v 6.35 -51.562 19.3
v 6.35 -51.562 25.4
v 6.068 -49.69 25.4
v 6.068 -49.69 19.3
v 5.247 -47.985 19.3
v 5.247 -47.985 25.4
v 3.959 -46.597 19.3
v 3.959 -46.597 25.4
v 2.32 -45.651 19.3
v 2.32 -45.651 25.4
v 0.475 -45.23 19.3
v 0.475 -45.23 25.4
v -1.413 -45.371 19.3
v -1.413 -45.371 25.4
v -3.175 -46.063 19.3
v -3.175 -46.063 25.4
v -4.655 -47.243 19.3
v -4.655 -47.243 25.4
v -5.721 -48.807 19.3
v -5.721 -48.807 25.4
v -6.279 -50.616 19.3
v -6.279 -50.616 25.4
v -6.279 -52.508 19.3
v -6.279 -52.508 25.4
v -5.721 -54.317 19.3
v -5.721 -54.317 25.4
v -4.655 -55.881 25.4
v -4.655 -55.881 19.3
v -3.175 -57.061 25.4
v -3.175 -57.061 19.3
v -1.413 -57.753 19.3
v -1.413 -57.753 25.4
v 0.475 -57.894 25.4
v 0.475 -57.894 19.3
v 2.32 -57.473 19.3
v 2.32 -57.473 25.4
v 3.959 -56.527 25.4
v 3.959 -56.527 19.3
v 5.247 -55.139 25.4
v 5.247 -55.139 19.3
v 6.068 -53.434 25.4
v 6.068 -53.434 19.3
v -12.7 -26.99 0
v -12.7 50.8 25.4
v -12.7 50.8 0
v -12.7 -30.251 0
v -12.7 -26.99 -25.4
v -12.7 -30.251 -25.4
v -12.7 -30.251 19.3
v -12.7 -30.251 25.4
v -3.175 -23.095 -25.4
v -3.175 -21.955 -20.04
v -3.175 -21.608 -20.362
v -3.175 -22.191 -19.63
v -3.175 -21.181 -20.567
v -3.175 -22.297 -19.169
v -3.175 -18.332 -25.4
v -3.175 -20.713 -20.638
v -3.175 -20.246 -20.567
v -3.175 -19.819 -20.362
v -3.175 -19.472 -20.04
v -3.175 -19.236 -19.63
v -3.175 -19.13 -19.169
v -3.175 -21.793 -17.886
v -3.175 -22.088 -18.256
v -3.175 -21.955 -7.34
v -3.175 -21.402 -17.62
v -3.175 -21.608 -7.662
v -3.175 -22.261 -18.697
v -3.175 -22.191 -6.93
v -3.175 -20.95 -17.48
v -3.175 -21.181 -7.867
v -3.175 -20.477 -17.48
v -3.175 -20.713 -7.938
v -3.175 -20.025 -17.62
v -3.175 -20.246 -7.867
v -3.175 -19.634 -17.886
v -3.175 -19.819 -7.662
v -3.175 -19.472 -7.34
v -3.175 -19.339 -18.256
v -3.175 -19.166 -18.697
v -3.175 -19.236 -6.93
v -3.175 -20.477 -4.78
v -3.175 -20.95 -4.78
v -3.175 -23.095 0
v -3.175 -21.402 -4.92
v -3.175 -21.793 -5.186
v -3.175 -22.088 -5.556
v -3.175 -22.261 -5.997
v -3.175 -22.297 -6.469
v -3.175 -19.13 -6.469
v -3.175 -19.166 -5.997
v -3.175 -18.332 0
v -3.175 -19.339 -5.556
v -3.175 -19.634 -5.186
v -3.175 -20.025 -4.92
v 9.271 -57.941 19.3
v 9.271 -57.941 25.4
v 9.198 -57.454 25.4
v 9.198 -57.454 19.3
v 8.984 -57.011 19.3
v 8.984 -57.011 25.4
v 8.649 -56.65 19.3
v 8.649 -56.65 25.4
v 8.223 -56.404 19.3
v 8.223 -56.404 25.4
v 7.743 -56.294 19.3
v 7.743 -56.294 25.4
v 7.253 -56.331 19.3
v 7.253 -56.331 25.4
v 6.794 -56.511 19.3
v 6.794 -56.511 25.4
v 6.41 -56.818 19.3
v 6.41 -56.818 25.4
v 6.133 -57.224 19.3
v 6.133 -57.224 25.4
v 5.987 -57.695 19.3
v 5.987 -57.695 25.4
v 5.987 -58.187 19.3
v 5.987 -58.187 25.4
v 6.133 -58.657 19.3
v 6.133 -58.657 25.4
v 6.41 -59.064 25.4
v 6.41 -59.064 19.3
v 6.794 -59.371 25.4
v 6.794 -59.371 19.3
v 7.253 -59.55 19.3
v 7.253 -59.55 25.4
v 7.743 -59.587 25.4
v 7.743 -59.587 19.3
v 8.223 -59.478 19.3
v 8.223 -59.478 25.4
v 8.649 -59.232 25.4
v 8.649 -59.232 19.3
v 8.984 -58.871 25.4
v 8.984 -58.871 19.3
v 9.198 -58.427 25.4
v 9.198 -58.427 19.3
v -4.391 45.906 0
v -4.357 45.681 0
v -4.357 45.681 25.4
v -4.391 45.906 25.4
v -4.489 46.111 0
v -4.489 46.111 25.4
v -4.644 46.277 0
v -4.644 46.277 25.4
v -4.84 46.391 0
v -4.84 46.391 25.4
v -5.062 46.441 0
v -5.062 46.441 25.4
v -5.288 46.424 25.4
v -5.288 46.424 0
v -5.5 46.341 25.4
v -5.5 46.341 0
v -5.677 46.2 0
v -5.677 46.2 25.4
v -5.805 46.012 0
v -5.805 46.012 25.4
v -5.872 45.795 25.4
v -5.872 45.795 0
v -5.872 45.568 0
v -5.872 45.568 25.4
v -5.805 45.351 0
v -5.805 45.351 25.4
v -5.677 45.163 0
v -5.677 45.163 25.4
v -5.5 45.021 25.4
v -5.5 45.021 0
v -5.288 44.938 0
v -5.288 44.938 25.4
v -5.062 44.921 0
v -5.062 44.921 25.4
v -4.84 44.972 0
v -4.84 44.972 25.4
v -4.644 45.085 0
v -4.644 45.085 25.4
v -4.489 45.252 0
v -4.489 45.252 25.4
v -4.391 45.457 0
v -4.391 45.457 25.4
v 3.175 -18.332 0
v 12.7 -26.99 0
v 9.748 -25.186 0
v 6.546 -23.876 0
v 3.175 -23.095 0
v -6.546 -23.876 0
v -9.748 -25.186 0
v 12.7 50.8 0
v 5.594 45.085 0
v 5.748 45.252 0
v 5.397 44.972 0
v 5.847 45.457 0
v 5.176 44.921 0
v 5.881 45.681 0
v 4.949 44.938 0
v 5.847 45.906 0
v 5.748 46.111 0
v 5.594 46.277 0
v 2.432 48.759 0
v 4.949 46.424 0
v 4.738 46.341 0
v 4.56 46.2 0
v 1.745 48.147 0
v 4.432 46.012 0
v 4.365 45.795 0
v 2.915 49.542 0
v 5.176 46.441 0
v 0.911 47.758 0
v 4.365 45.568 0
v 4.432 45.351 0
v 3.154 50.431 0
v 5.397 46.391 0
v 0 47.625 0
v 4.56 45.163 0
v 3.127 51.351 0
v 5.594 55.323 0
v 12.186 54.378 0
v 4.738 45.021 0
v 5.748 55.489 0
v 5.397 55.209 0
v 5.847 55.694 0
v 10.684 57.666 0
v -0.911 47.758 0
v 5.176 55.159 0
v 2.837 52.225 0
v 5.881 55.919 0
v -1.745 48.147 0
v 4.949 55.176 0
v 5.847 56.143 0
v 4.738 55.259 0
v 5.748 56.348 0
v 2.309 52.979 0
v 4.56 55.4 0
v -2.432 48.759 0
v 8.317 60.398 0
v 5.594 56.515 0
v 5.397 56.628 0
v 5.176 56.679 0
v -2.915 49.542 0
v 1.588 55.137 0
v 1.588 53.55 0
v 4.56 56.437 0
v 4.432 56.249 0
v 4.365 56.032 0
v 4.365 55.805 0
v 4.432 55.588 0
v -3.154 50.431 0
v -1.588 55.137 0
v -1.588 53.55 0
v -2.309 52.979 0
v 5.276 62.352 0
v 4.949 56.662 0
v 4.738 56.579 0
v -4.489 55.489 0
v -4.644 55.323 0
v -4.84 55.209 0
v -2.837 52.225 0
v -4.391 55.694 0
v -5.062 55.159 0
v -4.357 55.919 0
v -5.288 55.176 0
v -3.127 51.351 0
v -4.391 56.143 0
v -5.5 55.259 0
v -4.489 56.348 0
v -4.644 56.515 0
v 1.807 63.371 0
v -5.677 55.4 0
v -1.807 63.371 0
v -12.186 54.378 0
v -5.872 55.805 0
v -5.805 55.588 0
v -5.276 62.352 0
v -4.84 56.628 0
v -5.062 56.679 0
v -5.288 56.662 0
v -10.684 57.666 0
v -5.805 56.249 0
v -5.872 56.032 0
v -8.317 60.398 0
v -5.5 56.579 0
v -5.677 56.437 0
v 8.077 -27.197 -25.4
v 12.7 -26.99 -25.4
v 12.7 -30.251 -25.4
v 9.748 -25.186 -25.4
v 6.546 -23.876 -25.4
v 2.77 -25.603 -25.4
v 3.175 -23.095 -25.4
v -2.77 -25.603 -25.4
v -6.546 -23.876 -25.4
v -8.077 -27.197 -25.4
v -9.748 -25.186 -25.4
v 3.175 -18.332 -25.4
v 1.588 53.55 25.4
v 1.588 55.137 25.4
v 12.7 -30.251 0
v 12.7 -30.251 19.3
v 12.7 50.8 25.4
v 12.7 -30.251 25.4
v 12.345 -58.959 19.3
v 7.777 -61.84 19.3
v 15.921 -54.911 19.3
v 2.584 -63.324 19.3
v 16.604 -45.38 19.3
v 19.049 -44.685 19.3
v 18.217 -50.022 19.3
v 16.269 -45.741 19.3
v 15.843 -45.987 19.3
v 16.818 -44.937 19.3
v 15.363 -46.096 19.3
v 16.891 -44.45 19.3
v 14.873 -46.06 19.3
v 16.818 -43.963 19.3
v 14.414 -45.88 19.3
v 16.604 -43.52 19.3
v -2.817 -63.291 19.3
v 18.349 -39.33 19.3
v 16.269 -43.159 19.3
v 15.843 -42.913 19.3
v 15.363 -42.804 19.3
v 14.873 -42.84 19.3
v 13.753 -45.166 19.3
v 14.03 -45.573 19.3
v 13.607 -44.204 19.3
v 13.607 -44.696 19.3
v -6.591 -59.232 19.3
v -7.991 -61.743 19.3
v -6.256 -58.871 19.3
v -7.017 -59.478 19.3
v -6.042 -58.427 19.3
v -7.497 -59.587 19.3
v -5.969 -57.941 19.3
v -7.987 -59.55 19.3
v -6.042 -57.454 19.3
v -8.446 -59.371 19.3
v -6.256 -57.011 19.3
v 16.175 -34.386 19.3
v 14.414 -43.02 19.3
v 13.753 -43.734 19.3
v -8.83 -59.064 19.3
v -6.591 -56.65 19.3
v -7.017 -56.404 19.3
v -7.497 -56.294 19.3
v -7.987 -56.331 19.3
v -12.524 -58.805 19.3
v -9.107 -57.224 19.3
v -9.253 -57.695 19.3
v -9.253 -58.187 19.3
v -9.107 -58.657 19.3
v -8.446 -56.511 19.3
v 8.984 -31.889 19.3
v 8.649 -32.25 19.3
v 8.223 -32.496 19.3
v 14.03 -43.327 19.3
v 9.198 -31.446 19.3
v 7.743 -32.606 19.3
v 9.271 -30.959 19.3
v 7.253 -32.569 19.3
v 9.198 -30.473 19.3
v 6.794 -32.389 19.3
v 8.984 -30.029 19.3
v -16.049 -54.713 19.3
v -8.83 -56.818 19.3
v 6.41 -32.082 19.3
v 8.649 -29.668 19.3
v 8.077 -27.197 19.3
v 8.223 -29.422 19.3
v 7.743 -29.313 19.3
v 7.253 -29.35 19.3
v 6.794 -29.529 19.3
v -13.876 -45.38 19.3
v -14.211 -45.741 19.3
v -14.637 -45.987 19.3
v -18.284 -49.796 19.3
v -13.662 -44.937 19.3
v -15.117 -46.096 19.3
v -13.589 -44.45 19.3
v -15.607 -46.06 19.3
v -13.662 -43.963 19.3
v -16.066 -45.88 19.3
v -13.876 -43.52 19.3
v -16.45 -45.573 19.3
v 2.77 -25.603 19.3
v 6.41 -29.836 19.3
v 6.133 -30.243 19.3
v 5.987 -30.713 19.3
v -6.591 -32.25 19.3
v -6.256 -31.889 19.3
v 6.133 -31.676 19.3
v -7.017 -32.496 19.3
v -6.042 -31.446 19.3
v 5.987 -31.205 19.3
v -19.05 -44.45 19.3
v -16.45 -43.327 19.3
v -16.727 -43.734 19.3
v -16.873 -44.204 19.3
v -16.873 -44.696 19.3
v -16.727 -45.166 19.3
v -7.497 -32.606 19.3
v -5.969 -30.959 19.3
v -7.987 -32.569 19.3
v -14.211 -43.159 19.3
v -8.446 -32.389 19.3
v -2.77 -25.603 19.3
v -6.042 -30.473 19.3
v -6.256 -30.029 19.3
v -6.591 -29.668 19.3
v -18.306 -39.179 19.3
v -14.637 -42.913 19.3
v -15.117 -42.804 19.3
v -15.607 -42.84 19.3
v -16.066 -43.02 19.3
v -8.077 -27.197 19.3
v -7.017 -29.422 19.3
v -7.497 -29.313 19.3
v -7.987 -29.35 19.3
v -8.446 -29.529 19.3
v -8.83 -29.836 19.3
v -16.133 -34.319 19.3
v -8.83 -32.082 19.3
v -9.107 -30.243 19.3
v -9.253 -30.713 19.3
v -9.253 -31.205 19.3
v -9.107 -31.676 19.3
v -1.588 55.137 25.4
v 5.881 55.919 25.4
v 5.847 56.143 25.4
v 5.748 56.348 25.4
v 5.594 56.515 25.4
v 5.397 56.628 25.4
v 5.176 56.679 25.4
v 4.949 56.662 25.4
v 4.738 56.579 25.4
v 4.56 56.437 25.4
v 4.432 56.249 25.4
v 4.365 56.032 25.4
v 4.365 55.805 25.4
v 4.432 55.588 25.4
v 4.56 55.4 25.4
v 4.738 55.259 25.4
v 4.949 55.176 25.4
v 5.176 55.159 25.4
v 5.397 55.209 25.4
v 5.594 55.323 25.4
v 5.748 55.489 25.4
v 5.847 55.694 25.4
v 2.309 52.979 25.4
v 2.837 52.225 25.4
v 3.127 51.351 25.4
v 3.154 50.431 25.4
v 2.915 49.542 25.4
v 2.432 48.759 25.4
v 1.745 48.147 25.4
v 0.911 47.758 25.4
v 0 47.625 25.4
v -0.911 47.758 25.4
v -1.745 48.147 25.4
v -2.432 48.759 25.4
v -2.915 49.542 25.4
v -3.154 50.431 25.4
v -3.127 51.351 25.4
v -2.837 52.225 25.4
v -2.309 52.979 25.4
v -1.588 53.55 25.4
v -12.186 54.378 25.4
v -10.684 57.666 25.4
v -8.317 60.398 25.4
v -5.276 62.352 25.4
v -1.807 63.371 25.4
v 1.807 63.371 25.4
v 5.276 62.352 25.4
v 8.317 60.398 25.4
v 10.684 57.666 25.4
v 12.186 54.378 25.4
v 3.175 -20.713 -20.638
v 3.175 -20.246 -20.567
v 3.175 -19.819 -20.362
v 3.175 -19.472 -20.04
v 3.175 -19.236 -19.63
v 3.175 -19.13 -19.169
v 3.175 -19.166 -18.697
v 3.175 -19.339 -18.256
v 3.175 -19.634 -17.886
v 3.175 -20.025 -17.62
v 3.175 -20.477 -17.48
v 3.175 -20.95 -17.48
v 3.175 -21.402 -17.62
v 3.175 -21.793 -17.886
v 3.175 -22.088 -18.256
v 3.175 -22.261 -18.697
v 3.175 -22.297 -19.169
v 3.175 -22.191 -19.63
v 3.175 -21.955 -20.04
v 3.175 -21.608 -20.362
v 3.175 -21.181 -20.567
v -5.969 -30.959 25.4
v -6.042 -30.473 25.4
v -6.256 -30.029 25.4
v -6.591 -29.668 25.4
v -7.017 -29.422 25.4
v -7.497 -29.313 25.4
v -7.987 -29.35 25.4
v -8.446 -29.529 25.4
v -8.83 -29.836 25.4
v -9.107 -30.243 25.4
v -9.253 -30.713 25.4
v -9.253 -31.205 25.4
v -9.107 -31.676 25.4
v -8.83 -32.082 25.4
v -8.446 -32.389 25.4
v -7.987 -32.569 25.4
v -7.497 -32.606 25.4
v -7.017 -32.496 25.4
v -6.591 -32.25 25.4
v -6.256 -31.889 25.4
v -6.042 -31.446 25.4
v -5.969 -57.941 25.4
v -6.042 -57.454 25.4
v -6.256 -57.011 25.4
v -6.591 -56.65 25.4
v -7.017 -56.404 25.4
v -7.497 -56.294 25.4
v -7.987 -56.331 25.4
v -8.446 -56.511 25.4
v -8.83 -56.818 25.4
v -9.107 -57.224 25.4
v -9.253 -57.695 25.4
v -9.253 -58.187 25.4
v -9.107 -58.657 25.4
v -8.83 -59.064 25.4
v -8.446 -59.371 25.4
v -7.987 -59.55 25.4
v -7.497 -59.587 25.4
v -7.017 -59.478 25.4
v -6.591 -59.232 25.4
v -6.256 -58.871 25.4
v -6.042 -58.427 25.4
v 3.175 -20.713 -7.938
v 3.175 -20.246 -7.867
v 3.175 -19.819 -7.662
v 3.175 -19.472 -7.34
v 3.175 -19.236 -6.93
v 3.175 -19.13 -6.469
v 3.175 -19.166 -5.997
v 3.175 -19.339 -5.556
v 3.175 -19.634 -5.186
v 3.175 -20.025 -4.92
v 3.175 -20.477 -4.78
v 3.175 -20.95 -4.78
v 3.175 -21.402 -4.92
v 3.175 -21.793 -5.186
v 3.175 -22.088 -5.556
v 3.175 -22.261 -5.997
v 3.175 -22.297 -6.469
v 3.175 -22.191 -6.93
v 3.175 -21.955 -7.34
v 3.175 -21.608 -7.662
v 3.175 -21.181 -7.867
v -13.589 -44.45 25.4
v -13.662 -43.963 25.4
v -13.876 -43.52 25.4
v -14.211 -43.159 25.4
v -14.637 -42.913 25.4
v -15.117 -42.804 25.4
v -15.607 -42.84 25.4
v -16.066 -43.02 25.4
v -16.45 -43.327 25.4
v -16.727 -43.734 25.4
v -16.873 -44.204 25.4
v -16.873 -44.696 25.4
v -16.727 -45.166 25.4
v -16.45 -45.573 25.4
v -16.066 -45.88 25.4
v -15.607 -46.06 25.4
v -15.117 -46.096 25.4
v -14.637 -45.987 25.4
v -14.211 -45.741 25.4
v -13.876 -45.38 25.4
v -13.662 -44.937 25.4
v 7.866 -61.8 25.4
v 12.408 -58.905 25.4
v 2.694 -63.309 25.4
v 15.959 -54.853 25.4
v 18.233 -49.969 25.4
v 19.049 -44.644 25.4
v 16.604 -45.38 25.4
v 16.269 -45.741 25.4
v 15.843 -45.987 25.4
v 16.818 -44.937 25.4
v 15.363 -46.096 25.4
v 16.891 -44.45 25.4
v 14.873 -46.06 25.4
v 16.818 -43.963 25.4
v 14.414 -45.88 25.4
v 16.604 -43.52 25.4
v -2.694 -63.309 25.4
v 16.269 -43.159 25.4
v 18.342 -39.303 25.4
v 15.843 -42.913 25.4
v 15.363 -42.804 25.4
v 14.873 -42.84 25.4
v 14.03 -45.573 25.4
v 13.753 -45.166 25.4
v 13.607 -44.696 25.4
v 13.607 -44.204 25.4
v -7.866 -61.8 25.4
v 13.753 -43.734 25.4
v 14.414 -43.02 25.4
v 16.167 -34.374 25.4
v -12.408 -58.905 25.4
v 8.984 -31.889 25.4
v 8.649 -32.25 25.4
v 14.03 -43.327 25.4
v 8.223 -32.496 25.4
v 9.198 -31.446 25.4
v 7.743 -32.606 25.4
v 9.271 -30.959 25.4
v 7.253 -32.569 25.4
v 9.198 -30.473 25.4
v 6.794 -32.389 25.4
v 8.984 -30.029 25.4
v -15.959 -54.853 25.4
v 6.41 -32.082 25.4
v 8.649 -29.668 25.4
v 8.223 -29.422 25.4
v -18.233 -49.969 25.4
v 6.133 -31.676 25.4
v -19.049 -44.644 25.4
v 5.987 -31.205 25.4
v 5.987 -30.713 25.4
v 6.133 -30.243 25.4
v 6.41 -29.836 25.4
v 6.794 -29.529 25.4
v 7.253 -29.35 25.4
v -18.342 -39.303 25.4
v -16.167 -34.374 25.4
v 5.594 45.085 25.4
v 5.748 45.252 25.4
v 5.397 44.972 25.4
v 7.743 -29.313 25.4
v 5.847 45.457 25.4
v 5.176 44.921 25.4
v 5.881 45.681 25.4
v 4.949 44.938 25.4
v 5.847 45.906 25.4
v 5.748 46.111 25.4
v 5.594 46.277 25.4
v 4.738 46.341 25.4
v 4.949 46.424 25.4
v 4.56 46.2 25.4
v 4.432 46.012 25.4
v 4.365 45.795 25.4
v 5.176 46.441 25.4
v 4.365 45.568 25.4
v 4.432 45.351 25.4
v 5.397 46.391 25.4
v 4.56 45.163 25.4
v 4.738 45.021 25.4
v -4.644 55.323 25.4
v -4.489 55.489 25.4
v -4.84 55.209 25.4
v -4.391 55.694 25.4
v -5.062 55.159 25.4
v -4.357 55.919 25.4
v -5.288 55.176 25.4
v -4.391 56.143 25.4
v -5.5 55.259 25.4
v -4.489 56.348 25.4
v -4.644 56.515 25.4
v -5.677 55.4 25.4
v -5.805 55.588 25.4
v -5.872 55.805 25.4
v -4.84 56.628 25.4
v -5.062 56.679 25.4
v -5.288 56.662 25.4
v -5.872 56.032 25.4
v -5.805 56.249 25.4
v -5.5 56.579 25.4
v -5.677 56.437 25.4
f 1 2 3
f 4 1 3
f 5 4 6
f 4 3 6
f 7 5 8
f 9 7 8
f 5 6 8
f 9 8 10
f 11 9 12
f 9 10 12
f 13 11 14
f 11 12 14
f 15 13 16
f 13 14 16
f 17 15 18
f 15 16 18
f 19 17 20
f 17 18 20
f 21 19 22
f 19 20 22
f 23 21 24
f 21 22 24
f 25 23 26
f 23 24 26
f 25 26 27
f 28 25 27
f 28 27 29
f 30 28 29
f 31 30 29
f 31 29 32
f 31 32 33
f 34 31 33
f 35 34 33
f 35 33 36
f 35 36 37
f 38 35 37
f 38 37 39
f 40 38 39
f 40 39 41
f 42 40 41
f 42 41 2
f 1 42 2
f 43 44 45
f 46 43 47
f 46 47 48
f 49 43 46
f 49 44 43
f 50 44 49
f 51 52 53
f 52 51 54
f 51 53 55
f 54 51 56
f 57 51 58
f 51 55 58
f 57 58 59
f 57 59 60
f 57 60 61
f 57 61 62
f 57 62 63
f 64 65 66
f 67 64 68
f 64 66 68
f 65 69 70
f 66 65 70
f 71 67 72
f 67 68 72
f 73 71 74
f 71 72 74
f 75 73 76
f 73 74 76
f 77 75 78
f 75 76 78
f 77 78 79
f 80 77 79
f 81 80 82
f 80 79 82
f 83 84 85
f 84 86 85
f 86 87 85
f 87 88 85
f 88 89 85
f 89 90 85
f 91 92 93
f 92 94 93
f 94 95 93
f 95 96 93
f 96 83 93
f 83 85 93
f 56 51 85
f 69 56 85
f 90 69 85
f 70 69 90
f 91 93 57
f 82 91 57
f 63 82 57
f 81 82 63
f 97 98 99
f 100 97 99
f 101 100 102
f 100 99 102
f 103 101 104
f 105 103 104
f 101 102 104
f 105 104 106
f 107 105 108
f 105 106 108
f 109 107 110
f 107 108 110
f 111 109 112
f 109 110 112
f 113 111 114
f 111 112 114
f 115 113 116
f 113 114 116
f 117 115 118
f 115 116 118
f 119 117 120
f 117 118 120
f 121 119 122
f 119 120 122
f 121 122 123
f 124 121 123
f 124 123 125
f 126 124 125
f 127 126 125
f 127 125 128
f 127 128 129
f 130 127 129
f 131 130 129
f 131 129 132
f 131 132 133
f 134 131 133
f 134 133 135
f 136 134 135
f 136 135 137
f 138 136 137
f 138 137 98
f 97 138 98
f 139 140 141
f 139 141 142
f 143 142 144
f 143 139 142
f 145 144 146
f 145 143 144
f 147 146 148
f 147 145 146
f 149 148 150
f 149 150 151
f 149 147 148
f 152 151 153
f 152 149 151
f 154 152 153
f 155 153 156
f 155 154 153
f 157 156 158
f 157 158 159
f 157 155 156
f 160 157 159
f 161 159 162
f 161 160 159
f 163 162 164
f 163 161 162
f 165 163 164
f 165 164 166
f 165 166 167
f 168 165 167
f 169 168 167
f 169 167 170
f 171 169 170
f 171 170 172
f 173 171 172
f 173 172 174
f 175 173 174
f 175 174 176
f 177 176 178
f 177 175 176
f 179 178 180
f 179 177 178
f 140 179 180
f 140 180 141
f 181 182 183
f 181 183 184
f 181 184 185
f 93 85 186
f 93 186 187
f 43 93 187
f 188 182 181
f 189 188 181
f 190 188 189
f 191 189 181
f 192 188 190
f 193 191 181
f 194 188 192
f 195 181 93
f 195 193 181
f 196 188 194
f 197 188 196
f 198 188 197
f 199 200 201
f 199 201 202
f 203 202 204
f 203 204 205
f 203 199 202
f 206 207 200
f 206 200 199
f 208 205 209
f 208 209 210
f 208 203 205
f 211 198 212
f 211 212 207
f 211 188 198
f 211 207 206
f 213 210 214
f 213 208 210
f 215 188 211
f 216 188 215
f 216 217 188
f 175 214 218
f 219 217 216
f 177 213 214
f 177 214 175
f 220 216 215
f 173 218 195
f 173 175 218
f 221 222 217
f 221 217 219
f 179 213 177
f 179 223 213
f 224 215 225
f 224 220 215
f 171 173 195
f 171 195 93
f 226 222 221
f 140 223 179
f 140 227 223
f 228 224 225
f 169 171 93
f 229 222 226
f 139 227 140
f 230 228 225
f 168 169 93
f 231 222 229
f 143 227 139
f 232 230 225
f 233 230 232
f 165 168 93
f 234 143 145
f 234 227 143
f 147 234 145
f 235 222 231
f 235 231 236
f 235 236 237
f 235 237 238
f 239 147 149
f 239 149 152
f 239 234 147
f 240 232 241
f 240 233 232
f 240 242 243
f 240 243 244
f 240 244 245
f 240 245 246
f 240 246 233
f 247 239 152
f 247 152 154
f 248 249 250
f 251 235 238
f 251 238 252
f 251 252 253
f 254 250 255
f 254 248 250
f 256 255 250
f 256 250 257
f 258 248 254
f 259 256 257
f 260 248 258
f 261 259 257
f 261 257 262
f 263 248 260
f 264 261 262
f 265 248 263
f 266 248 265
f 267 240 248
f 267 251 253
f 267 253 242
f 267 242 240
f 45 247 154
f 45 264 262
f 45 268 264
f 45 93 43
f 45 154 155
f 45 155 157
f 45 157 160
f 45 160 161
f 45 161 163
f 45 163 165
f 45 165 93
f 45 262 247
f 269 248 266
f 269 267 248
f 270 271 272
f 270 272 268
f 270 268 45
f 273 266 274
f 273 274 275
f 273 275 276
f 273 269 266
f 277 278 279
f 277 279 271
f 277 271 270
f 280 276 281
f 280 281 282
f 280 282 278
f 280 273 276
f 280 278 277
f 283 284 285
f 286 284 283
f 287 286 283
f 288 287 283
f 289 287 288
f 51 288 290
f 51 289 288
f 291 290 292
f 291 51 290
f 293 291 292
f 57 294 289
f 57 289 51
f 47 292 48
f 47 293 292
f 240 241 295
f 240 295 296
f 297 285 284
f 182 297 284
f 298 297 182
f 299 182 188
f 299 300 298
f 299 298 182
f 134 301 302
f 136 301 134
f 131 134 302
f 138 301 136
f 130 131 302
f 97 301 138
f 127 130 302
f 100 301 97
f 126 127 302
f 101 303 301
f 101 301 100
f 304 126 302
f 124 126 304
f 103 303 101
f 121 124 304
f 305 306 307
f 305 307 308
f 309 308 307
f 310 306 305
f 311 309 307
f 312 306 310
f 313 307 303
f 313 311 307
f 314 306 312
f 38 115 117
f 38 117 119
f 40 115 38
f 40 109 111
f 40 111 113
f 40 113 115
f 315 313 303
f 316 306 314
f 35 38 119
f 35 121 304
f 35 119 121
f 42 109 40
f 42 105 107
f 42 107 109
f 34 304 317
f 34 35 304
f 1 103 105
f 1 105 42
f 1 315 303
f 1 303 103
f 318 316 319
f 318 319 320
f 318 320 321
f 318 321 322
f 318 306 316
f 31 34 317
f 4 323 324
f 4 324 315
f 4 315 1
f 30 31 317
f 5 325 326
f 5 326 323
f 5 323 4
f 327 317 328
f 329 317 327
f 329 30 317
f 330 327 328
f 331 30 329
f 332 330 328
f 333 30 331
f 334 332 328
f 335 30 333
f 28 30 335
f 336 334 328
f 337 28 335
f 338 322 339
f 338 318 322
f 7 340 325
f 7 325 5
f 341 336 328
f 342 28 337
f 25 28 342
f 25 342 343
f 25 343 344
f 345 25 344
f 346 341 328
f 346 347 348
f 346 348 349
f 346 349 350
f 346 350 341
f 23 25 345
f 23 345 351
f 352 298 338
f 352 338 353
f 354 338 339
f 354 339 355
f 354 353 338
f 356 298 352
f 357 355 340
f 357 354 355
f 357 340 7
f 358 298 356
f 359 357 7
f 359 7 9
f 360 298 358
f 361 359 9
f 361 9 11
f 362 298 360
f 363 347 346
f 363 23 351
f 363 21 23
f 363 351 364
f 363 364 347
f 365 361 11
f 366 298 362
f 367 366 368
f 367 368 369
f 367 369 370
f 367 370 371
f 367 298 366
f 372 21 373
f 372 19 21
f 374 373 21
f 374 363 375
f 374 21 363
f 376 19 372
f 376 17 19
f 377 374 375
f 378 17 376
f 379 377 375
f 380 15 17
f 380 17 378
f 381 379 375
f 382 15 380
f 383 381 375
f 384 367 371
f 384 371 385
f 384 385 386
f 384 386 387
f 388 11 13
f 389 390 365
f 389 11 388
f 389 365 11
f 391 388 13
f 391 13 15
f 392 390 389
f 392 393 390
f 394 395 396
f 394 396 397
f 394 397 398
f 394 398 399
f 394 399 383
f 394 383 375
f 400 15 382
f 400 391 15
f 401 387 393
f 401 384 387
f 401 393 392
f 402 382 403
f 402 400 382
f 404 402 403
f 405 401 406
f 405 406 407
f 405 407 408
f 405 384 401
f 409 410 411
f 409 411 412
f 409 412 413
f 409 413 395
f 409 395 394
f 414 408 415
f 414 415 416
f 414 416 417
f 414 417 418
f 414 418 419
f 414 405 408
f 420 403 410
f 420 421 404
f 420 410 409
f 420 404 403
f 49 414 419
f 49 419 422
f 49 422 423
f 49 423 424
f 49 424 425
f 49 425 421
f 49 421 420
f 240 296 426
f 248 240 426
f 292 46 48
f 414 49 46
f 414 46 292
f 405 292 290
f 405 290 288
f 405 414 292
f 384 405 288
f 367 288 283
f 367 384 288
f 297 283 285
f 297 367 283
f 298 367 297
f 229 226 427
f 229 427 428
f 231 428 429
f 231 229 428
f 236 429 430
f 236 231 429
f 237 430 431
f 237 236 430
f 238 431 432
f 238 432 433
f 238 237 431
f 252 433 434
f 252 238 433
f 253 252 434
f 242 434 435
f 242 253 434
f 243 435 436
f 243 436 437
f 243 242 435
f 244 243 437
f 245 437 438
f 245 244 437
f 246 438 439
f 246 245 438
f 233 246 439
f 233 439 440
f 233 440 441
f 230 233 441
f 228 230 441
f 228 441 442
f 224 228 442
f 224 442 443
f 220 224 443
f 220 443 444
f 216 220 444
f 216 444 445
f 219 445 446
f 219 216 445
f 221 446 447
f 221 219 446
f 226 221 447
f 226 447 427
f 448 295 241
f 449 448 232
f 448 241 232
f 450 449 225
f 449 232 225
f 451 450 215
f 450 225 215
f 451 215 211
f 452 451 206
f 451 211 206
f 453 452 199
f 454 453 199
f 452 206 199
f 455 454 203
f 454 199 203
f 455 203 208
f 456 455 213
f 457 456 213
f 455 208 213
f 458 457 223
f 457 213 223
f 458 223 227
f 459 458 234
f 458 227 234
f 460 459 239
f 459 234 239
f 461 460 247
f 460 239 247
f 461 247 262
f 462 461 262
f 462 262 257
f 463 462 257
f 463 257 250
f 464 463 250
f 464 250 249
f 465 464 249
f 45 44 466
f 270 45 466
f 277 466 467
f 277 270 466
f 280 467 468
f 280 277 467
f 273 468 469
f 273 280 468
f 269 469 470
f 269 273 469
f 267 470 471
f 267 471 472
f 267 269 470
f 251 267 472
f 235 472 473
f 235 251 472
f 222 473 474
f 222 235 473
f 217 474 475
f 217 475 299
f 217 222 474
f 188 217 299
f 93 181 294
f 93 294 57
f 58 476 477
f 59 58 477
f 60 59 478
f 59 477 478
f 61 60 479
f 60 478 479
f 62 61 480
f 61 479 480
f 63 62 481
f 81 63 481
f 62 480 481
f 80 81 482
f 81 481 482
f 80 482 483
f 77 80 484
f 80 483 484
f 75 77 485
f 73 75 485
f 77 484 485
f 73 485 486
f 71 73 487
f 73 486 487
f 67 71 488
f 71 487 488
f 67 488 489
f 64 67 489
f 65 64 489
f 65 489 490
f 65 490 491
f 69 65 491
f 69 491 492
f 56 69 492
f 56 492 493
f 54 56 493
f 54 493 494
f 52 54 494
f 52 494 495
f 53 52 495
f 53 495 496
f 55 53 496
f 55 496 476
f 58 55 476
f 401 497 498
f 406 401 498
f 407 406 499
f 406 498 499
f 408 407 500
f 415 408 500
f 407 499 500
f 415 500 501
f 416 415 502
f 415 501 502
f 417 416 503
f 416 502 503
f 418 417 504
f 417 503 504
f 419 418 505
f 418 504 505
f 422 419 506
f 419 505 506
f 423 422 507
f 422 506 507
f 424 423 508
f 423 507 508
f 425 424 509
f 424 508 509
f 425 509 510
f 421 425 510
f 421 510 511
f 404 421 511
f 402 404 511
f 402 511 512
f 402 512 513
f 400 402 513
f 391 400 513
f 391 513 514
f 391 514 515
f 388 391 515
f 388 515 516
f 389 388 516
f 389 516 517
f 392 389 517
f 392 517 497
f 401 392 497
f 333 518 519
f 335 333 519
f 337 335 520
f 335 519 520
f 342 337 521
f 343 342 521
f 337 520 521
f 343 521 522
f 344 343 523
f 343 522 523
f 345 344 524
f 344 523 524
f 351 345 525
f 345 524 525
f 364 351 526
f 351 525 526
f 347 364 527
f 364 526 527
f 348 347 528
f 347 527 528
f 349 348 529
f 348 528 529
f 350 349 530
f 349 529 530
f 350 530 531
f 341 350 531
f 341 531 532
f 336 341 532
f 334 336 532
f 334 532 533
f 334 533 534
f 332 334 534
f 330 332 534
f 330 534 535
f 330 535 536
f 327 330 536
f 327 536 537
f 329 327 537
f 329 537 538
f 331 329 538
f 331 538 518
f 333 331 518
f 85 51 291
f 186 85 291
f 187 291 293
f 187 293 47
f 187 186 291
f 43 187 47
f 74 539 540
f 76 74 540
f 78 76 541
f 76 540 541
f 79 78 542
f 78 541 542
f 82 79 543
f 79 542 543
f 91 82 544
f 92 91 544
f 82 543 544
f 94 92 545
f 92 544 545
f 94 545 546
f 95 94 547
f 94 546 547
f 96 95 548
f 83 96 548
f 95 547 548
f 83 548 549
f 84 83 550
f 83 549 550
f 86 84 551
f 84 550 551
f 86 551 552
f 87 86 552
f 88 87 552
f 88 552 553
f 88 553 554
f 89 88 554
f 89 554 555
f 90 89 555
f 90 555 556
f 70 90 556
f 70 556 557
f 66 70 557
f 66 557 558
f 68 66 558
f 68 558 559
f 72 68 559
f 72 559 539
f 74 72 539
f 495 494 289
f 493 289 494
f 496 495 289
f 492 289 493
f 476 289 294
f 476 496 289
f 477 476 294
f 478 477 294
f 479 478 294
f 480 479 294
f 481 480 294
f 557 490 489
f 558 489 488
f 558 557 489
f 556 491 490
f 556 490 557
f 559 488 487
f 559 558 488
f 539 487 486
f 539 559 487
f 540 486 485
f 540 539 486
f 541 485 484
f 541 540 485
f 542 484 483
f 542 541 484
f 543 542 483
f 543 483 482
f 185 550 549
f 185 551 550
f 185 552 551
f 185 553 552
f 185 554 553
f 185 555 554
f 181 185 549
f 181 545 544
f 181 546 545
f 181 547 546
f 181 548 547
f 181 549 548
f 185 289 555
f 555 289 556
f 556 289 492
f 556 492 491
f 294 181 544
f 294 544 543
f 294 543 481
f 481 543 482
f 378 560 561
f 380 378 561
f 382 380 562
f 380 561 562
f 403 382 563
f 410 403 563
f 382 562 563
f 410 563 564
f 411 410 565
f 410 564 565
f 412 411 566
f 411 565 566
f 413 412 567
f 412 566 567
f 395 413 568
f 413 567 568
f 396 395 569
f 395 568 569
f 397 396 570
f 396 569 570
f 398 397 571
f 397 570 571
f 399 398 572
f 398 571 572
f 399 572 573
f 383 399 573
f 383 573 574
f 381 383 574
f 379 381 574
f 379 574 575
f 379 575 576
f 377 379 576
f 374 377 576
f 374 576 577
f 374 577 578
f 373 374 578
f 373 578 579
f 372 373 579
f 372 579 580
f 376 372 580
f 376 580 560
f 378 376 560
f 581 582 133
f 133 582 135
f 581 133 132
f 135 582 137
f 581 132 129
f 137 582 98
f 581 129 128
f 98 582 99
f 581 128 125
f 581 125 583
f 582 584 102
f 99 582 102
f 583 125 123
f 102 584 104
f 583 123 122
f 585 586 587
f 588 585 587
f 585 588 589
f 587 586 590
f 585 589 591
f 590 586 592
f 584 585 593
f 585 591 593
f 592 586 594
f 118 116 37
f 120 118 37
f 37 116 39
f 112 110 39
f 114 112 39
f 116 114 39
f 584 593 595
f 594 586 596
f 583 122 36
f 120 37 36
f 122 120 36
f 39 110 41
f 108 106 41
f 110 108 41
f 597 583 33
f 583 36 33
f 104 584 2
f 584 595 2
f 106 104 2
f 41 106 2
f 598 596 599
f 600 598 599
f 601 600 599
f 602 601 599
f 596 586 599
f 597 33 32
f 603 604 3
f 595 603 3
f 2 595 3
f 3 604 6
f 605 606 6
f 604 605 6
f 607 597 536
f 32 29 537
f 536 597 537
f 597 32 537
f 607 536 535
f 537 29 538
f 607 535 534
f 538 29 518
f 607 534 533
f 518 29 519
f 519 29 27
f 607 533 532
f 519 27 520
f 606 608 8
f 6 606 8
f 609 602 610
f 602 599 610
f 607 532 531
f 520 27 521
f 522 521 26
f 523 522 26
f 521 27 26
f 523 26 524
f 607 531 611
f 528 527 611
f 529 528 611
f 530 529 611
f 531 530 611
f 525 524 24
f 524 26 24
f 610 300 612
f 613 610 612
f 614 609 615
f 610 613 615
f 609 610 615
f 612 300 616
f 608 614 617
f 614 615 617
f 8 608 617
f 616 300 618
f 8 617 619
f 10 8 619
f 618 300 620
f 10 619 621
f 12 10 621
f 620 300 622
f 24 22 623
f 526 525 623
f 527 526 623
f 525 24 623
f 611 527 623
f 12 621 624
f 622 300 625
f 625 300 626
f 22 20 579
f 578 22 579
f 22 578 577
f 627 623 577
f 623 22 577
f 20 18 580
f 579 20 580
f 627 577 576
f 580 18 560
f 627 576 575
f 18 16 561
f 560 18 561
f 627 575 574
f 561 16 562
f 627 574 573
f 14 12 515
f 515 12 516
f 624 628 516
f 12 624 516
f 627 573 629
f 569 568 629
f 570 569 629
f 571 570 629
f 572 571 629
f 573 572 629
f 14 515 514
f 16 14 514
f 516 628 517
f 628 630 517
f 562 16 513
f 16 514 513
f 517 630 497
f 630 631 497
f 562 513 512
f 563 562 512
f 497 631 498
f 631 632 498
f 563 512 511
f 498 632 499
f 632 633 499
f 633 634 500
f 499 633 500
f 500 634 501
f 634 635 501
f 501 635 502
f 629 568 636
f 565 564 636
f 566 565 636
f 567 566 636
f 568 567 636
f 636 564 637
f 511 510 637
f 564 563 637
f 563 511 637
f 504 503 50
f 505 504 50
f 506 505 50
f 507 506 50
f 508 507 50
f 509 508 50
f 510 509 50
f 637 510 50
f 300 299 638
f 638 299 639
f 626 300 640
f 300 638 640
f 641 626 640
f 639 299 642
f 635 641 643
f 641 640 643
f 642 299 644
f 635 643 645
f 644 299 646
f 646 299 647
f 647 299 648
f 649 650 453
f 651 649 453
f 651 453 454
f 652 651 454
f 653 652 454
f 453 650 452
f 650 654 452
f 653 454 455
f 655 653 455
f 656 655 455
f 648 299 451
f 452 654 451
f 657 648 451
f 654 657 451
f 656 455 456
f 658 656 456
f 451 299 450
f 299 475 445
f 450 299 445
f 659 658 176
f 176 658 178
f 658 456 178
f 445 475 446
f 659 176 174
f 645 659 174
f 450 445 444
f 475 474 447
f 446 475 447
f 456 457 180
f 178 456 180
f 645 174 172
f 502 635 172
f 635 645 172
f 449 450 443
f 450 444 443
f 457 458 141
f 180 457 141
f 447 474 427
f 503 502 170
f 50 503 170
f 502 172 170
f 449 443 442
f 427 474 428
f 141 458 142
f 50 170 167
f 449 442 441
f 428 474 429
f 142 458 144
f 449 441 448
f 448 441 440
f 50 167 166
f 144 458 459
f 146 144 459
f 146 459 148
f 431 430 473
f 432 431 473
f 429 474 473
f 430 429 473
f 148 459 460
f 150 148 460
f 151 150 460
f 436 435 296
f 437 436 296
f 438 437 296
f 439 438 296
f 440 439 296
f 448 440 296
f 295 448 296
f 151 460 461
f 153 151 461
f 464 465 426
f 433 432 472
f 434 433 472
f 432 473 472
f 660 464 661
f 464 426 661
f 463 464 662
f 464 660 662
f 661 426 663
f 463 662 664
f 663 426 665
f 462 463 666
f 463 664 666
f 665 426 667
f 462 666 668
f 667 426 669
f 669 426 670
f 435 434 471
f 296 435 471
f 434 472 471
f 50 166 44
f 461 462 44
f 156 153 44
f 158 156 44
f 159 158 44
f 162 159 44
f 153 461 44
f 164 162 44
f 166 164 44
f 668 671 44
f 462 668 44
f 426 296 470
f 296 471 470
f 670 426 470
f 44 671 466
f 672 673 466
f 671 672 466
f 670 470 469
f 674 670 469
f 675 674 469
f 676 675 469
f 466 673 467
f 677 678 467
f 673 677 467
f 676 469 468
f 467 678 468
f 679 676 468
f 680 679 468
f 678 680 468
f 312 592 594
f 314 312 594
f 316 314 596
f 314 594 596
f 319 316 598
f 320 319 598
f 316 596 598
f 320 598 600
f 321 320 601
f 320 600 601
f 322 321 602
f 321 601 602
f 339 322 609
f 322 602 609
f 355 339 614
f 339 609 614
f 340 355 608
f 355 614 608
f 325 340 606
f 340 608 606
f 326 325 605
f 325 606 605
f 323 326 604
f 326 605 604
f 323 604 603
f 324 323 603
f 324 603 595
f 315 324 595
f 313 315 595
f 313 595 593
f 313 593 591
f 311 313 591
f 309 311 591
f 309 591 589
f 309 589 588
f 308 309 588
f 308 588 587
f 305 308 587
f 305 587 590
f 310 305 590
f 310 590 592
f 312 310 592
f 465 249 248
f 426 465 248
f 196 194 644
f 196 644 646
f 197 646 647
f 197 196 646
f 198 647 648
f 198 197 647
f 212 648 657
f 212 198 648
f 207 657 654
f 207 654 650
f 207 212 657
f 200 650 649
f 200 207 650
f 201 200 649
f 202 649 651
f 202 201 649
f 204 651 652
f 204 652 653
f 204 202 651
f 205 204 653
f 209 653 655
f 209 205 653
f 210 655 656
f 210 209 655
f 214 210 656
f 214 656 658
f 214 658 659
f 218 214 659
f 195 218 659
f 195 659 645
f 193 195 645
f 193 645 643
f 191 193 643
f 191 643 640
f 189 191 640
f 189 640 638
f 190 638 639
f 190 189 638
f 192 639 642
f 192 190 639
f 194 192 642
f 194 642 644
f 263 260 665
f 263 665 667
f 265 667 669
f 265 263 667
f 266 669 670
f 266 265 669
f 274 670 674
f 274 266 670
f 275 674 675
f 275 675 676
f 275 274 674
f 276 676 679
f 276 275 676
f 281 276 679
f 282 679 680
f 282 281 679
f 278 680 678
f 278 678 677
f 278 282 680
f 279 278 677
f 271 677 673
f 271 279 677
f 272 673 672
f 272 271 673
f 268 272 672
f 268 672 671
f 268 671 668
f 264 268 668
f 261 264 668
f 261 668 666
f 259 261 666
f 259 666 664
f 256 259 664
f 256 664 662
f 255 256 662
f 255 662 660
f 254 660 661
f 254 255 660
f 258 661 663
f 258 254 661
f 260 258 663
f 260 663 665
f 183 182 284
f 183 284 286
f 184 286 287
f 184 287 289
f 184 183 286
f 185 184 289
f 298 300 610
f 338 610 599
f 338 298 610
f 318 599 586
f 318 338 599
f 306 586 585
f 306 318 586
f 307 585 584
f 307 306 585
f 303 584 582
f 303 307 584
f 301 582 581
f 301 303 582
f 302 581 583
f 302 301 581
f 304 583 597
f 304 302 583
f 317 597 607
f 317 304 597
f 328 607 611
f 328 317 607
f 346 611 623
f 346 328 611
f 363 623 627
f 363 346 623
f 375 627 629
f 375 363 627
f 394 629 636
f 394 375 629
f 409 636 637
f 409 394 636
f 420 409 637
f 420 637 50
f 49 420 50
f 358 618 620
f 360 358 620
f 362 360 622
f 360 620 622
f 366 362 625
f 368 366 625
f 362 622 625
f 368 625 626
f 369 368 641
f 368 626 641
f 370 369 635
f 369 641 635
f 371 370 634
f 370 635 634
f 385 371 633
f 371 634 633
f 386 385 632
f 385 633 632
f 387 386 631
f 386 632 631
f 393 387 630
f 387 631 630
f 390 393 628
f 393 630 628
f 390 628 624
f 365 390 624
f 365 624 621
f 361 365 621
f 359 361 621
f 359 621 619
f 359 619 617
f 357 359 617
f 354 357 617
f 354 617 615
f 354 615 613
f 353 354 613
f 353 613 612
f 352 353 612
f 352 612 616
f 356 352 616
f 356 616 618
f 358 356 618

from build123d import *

# Parameters (mm, degrees)
SKETCH1_R           = 3.175
SKETCH1_R_2         = 0.762
BOSS_EXTRUDE1_DEPTH = 25.4
SKETCH2_R           = 19.05
SKETCH2_R_2         = 3.175
BOSS_EXTRUDE2_DEPTH = 25.4
SKETCH3_R           = 1.651
CUT_EXTRUDE1_DEPTH  = 25.4
SKETCH5_R           = 6.35
CUT_EXTRUDE2_DEPTH  = 25.4
SKETCH6_W           = 3.175
SKETCH6_H           = 1.5875
CUT_EXTRUDE3_DEPTH  = 25.4
SKETCH2_2_R         = 3.175
CUT_EXTRUDE6_DEPTH  = 25.4
SKETCH8_R           = 1.651
SKETCH8_R_2         = 6.35
CUT_EXTRUDE4_DEPTH  = 19.3
BOSS_EXTRUDE3_DEPTH = 25.4
SKETCH10_W          = 6.35
SKETCH10_H          = 4.7625
BOSS_EXTRUDE4_DEPTH = 25.4
SKETCH11_R          = 1.5875
CUT_EXTRUDE5_DEPTH  = 23.225


with BuildPart() as part:
    # Sketch1 → Boss-Extrude1 (new body)
    with BuildSketch(Plane.XY):
        with BuildLine():
            Line((12.7, 50.8), (12.7, -50.8))
            ThreePointArc((12.7, -50.8), (0, -63.5), (-12.7, -50.8))
            Line((-12.7, -50.8), (-12.7, 50.8))
            ThreePointArc((-12.7, 50.8), (0, 63.5), (12.7, 50.8))
        make_face()
        with Locations((0, 50.8)):
            Circle(SKETCH1_R, mode=Mode.SUBTRACT)
        with Locations((-5.118745989, 55.918745989)):
            Circle(SKETCH1_R_2, mode=Mode.SUBTRACT)
        with Locations((5.118745989, 55.918745989)):
            Circle(SKETCH1_R_2, mode=Mode.SUBTRACT)
        with Locations((5.118745989, 45.681254011)):
            Circle(SKETCH1_R_2, mode=Mode.SUBTRACT)
        with Locations((-5.118745989, 45.681254011)):
            Circle(SKETCH1_R_2, mode=Mode.SUBTRACT)
    extrude(amount=BOSS_EXTRUDE1_DEPTH)

    # Sketch2 → Boss-Extrude2 (add)
    with BuildSketch(Plane(origin=(0, 0, 0), x_dir=(-1, 0, 0), z_dir=(0, 0, -1))):
        with Locations((0, -44.45)):
            Circle(SKETCH2_R)
        with Locations((0, 50.8)):
            Circle(SKETCH2_R_2)
    extrude(amount=-BOSS_EXTRUDE2_DEPTH)

    # Sketch3 → Cut-Extrude1 (cut)
    with BuildSketch(Plane.XY.offset(25.4)):
        with Locations((-7.62, -30.959275928)):
            Circle(SKETCH3_R)
        with Locations((7.62, -30.959275928)):
            Circle(SKETCH3_R)
        with Locations((-15.24, -44.45)):
            Circle(SKETCH3_R)
        with Locations((-7.62, -57.940724072)):
            Circle(SKETCH3_R)
        with Locations((7.62, -57.940724072)):
            Circle(SKETCH3_R)
        with Locations((15.24, -44.45)):
            Circle(SKETCH3_R)
    extrude(amount=-CUT_EXTRUDE1_DEPTH, mode=Mode.SUBTRACT)

    # Sketch5 → Cut-Extrude2 (cut)
    with BuildSketch(Plane.XY.offset(25.4)):
        with Locations((0, -51.562)):
            Circle(SKETCH5_R)
    extrude(amount=-CUT_EXTRUDE2_DEPTH, mode=Mode.SUBTRACT)

    # Sketch6 → Cut-Extrude3 (cut)
    with BuildSketch(Plane(origin=(0, 0, 0), x_dir=(-1, 0, 0), z_dir=(0, 0, -1))):
        with Locations((0, 54.343380657)):
            Rectangle(SKETCH6_W, SKETCH6_H)
    extrude(amount=-CUT_EXTRUDE3_DEPTH, mode=Mode.SUBTRACT)

    # Sketch2<2> → Cut-Extrude6 (cut)
    with BuildSketch(Plane(origin=(0, 0, 0), x_dir=(-1, 0, 0), z_dir=(0, 0, -1))):
        with Locations((0, 50.8)):
            Circle(SKETCH2_2_R)
    extrude(amount=-CUT_EXTRUDE6_DEPTH, mode=Mode.SUBTRACT)

    # Sketch8 → Cut-Extrude4 (cut)
    with BuildSketch(Plane(origin=(0, 0, 0), x_dir=(-1, 0, 0), z_dir=(0, 0, -1))):
        with BuildLine():
            ThreePointArc((-12.7, -30.250968343), (-7.777129933, -61.840191201), (19.05, -44.45))
            ThreePointArc((19.05, -44.45), (17.390191201, -36.672870067), (12.7, -30.250968343))
            ThreePointArc((12.7, -30.250968343), (0, -25.4), (-12.7, -30.250968343))
        make_face()
        with Locations((-7.62, -57.940724072)):
            Circle(SKETCH8_R, mode=Mode.SUBTRACT)
        with Locations((7.62, -57.940724072)):
            Circle(SKETCH8_R, mode=Mode.SUBTRACT)
        with Locations((0, -51.562)):
            Circle(SKETCH8_R_2, mode=Mode.SUBTRACT)
        with Locations((-15.24, -44.45)):
            Circle(SKETCH8_R, mode=Mode.SUBTRACT)
        with Locations((-7.62, -30.959275928)):
            Circle(SKETCH8_R, mode=Mode.SUBTRACT)
        with Locations((15.24, -44.45)):
            Circle(SKETCH8_R, mode=Mode.SUBTRACT)
        with Locations((7.62, -30.959275928)):
            Circle(SKETCH8_R, mode=Mode.SUBTRACT)
        with Locations((7.62, -30.959275928)):
            Circle(SKETCH8_R)
        with Locations((-7.62, -30.959275928)):
            Circle(SKETCH8_R)
        with Locations((-15.24, -44.45)):
            Circle(SKETCH8_R)
        with Locations((-7.62, -57.940724072)):
            Circle(SKETCH8_R)
        with Locations((0, -51.562)):
            Circle(SKETCH8_R_2)
        with Locations((7.62, -57.940724072)):
            Circle(SKETCH8_R)
        with Locations((15.24, -44.45)):
            Circle(SKETCH8_R)
    extrude(amount=-CUT_EXTRUDE4_DEPTH, mode=Mode.SUBTRACT)

    # Sketch9 → Boss-Extrude3 (add)
    with BuildSketch(Plane(origin=(0, 0, 0), x_dir=(-1, 0, 0), z_dir=(0, 0, -1))):
        with BuildLine():
            Line((-12.7, -30.250968343), (-12.7, -26.990386602))
            ThreePointArc((-12.7, -26.990386602), (0, -22.86), (12.7, -26.990386602))
            Line((12.7, -26.990386602), (12.7, -30.250968343))
            ThreePointArc((12.7, -30.250968343), (0, -25.4), (-12.7, -30.250968343))
        make_face()
    extrude(amount=BOSS_EXTRUDE3_DEPTH)

    # Sketch10 → Boss-Extrude4 (add)
    with BuildSketch(Plane(origin=(0, 0, 0), x_dir=(-1, 0, 0), z_dir=(0, 0, -1))):
        with Locations((0, -20.713481915)):
            Rectangle(SKETCH10_W, SKETCH10_H)
    extrude(amount=BOSS_EXTRUDE4_DEPTH)

    # Sketch11 → Cut-Extrude5 (cut, through all)
    with BuildSketch(Plane(origin=(3.175, 0, 0), x_dir=(0, 0, -1), z_dir=(1, 0, 0))):
        with Locations((6.35, -20.713481915)):
            Circle(SKETCH11_R)
        with Locations((19.05, -20.713481915)):
            Circle(SKETCH11_R)
    extrude(amount=-CUT_EXTRUDE5_DEPTH, mode=Mode.SUBTRACT)


solid = part.part
